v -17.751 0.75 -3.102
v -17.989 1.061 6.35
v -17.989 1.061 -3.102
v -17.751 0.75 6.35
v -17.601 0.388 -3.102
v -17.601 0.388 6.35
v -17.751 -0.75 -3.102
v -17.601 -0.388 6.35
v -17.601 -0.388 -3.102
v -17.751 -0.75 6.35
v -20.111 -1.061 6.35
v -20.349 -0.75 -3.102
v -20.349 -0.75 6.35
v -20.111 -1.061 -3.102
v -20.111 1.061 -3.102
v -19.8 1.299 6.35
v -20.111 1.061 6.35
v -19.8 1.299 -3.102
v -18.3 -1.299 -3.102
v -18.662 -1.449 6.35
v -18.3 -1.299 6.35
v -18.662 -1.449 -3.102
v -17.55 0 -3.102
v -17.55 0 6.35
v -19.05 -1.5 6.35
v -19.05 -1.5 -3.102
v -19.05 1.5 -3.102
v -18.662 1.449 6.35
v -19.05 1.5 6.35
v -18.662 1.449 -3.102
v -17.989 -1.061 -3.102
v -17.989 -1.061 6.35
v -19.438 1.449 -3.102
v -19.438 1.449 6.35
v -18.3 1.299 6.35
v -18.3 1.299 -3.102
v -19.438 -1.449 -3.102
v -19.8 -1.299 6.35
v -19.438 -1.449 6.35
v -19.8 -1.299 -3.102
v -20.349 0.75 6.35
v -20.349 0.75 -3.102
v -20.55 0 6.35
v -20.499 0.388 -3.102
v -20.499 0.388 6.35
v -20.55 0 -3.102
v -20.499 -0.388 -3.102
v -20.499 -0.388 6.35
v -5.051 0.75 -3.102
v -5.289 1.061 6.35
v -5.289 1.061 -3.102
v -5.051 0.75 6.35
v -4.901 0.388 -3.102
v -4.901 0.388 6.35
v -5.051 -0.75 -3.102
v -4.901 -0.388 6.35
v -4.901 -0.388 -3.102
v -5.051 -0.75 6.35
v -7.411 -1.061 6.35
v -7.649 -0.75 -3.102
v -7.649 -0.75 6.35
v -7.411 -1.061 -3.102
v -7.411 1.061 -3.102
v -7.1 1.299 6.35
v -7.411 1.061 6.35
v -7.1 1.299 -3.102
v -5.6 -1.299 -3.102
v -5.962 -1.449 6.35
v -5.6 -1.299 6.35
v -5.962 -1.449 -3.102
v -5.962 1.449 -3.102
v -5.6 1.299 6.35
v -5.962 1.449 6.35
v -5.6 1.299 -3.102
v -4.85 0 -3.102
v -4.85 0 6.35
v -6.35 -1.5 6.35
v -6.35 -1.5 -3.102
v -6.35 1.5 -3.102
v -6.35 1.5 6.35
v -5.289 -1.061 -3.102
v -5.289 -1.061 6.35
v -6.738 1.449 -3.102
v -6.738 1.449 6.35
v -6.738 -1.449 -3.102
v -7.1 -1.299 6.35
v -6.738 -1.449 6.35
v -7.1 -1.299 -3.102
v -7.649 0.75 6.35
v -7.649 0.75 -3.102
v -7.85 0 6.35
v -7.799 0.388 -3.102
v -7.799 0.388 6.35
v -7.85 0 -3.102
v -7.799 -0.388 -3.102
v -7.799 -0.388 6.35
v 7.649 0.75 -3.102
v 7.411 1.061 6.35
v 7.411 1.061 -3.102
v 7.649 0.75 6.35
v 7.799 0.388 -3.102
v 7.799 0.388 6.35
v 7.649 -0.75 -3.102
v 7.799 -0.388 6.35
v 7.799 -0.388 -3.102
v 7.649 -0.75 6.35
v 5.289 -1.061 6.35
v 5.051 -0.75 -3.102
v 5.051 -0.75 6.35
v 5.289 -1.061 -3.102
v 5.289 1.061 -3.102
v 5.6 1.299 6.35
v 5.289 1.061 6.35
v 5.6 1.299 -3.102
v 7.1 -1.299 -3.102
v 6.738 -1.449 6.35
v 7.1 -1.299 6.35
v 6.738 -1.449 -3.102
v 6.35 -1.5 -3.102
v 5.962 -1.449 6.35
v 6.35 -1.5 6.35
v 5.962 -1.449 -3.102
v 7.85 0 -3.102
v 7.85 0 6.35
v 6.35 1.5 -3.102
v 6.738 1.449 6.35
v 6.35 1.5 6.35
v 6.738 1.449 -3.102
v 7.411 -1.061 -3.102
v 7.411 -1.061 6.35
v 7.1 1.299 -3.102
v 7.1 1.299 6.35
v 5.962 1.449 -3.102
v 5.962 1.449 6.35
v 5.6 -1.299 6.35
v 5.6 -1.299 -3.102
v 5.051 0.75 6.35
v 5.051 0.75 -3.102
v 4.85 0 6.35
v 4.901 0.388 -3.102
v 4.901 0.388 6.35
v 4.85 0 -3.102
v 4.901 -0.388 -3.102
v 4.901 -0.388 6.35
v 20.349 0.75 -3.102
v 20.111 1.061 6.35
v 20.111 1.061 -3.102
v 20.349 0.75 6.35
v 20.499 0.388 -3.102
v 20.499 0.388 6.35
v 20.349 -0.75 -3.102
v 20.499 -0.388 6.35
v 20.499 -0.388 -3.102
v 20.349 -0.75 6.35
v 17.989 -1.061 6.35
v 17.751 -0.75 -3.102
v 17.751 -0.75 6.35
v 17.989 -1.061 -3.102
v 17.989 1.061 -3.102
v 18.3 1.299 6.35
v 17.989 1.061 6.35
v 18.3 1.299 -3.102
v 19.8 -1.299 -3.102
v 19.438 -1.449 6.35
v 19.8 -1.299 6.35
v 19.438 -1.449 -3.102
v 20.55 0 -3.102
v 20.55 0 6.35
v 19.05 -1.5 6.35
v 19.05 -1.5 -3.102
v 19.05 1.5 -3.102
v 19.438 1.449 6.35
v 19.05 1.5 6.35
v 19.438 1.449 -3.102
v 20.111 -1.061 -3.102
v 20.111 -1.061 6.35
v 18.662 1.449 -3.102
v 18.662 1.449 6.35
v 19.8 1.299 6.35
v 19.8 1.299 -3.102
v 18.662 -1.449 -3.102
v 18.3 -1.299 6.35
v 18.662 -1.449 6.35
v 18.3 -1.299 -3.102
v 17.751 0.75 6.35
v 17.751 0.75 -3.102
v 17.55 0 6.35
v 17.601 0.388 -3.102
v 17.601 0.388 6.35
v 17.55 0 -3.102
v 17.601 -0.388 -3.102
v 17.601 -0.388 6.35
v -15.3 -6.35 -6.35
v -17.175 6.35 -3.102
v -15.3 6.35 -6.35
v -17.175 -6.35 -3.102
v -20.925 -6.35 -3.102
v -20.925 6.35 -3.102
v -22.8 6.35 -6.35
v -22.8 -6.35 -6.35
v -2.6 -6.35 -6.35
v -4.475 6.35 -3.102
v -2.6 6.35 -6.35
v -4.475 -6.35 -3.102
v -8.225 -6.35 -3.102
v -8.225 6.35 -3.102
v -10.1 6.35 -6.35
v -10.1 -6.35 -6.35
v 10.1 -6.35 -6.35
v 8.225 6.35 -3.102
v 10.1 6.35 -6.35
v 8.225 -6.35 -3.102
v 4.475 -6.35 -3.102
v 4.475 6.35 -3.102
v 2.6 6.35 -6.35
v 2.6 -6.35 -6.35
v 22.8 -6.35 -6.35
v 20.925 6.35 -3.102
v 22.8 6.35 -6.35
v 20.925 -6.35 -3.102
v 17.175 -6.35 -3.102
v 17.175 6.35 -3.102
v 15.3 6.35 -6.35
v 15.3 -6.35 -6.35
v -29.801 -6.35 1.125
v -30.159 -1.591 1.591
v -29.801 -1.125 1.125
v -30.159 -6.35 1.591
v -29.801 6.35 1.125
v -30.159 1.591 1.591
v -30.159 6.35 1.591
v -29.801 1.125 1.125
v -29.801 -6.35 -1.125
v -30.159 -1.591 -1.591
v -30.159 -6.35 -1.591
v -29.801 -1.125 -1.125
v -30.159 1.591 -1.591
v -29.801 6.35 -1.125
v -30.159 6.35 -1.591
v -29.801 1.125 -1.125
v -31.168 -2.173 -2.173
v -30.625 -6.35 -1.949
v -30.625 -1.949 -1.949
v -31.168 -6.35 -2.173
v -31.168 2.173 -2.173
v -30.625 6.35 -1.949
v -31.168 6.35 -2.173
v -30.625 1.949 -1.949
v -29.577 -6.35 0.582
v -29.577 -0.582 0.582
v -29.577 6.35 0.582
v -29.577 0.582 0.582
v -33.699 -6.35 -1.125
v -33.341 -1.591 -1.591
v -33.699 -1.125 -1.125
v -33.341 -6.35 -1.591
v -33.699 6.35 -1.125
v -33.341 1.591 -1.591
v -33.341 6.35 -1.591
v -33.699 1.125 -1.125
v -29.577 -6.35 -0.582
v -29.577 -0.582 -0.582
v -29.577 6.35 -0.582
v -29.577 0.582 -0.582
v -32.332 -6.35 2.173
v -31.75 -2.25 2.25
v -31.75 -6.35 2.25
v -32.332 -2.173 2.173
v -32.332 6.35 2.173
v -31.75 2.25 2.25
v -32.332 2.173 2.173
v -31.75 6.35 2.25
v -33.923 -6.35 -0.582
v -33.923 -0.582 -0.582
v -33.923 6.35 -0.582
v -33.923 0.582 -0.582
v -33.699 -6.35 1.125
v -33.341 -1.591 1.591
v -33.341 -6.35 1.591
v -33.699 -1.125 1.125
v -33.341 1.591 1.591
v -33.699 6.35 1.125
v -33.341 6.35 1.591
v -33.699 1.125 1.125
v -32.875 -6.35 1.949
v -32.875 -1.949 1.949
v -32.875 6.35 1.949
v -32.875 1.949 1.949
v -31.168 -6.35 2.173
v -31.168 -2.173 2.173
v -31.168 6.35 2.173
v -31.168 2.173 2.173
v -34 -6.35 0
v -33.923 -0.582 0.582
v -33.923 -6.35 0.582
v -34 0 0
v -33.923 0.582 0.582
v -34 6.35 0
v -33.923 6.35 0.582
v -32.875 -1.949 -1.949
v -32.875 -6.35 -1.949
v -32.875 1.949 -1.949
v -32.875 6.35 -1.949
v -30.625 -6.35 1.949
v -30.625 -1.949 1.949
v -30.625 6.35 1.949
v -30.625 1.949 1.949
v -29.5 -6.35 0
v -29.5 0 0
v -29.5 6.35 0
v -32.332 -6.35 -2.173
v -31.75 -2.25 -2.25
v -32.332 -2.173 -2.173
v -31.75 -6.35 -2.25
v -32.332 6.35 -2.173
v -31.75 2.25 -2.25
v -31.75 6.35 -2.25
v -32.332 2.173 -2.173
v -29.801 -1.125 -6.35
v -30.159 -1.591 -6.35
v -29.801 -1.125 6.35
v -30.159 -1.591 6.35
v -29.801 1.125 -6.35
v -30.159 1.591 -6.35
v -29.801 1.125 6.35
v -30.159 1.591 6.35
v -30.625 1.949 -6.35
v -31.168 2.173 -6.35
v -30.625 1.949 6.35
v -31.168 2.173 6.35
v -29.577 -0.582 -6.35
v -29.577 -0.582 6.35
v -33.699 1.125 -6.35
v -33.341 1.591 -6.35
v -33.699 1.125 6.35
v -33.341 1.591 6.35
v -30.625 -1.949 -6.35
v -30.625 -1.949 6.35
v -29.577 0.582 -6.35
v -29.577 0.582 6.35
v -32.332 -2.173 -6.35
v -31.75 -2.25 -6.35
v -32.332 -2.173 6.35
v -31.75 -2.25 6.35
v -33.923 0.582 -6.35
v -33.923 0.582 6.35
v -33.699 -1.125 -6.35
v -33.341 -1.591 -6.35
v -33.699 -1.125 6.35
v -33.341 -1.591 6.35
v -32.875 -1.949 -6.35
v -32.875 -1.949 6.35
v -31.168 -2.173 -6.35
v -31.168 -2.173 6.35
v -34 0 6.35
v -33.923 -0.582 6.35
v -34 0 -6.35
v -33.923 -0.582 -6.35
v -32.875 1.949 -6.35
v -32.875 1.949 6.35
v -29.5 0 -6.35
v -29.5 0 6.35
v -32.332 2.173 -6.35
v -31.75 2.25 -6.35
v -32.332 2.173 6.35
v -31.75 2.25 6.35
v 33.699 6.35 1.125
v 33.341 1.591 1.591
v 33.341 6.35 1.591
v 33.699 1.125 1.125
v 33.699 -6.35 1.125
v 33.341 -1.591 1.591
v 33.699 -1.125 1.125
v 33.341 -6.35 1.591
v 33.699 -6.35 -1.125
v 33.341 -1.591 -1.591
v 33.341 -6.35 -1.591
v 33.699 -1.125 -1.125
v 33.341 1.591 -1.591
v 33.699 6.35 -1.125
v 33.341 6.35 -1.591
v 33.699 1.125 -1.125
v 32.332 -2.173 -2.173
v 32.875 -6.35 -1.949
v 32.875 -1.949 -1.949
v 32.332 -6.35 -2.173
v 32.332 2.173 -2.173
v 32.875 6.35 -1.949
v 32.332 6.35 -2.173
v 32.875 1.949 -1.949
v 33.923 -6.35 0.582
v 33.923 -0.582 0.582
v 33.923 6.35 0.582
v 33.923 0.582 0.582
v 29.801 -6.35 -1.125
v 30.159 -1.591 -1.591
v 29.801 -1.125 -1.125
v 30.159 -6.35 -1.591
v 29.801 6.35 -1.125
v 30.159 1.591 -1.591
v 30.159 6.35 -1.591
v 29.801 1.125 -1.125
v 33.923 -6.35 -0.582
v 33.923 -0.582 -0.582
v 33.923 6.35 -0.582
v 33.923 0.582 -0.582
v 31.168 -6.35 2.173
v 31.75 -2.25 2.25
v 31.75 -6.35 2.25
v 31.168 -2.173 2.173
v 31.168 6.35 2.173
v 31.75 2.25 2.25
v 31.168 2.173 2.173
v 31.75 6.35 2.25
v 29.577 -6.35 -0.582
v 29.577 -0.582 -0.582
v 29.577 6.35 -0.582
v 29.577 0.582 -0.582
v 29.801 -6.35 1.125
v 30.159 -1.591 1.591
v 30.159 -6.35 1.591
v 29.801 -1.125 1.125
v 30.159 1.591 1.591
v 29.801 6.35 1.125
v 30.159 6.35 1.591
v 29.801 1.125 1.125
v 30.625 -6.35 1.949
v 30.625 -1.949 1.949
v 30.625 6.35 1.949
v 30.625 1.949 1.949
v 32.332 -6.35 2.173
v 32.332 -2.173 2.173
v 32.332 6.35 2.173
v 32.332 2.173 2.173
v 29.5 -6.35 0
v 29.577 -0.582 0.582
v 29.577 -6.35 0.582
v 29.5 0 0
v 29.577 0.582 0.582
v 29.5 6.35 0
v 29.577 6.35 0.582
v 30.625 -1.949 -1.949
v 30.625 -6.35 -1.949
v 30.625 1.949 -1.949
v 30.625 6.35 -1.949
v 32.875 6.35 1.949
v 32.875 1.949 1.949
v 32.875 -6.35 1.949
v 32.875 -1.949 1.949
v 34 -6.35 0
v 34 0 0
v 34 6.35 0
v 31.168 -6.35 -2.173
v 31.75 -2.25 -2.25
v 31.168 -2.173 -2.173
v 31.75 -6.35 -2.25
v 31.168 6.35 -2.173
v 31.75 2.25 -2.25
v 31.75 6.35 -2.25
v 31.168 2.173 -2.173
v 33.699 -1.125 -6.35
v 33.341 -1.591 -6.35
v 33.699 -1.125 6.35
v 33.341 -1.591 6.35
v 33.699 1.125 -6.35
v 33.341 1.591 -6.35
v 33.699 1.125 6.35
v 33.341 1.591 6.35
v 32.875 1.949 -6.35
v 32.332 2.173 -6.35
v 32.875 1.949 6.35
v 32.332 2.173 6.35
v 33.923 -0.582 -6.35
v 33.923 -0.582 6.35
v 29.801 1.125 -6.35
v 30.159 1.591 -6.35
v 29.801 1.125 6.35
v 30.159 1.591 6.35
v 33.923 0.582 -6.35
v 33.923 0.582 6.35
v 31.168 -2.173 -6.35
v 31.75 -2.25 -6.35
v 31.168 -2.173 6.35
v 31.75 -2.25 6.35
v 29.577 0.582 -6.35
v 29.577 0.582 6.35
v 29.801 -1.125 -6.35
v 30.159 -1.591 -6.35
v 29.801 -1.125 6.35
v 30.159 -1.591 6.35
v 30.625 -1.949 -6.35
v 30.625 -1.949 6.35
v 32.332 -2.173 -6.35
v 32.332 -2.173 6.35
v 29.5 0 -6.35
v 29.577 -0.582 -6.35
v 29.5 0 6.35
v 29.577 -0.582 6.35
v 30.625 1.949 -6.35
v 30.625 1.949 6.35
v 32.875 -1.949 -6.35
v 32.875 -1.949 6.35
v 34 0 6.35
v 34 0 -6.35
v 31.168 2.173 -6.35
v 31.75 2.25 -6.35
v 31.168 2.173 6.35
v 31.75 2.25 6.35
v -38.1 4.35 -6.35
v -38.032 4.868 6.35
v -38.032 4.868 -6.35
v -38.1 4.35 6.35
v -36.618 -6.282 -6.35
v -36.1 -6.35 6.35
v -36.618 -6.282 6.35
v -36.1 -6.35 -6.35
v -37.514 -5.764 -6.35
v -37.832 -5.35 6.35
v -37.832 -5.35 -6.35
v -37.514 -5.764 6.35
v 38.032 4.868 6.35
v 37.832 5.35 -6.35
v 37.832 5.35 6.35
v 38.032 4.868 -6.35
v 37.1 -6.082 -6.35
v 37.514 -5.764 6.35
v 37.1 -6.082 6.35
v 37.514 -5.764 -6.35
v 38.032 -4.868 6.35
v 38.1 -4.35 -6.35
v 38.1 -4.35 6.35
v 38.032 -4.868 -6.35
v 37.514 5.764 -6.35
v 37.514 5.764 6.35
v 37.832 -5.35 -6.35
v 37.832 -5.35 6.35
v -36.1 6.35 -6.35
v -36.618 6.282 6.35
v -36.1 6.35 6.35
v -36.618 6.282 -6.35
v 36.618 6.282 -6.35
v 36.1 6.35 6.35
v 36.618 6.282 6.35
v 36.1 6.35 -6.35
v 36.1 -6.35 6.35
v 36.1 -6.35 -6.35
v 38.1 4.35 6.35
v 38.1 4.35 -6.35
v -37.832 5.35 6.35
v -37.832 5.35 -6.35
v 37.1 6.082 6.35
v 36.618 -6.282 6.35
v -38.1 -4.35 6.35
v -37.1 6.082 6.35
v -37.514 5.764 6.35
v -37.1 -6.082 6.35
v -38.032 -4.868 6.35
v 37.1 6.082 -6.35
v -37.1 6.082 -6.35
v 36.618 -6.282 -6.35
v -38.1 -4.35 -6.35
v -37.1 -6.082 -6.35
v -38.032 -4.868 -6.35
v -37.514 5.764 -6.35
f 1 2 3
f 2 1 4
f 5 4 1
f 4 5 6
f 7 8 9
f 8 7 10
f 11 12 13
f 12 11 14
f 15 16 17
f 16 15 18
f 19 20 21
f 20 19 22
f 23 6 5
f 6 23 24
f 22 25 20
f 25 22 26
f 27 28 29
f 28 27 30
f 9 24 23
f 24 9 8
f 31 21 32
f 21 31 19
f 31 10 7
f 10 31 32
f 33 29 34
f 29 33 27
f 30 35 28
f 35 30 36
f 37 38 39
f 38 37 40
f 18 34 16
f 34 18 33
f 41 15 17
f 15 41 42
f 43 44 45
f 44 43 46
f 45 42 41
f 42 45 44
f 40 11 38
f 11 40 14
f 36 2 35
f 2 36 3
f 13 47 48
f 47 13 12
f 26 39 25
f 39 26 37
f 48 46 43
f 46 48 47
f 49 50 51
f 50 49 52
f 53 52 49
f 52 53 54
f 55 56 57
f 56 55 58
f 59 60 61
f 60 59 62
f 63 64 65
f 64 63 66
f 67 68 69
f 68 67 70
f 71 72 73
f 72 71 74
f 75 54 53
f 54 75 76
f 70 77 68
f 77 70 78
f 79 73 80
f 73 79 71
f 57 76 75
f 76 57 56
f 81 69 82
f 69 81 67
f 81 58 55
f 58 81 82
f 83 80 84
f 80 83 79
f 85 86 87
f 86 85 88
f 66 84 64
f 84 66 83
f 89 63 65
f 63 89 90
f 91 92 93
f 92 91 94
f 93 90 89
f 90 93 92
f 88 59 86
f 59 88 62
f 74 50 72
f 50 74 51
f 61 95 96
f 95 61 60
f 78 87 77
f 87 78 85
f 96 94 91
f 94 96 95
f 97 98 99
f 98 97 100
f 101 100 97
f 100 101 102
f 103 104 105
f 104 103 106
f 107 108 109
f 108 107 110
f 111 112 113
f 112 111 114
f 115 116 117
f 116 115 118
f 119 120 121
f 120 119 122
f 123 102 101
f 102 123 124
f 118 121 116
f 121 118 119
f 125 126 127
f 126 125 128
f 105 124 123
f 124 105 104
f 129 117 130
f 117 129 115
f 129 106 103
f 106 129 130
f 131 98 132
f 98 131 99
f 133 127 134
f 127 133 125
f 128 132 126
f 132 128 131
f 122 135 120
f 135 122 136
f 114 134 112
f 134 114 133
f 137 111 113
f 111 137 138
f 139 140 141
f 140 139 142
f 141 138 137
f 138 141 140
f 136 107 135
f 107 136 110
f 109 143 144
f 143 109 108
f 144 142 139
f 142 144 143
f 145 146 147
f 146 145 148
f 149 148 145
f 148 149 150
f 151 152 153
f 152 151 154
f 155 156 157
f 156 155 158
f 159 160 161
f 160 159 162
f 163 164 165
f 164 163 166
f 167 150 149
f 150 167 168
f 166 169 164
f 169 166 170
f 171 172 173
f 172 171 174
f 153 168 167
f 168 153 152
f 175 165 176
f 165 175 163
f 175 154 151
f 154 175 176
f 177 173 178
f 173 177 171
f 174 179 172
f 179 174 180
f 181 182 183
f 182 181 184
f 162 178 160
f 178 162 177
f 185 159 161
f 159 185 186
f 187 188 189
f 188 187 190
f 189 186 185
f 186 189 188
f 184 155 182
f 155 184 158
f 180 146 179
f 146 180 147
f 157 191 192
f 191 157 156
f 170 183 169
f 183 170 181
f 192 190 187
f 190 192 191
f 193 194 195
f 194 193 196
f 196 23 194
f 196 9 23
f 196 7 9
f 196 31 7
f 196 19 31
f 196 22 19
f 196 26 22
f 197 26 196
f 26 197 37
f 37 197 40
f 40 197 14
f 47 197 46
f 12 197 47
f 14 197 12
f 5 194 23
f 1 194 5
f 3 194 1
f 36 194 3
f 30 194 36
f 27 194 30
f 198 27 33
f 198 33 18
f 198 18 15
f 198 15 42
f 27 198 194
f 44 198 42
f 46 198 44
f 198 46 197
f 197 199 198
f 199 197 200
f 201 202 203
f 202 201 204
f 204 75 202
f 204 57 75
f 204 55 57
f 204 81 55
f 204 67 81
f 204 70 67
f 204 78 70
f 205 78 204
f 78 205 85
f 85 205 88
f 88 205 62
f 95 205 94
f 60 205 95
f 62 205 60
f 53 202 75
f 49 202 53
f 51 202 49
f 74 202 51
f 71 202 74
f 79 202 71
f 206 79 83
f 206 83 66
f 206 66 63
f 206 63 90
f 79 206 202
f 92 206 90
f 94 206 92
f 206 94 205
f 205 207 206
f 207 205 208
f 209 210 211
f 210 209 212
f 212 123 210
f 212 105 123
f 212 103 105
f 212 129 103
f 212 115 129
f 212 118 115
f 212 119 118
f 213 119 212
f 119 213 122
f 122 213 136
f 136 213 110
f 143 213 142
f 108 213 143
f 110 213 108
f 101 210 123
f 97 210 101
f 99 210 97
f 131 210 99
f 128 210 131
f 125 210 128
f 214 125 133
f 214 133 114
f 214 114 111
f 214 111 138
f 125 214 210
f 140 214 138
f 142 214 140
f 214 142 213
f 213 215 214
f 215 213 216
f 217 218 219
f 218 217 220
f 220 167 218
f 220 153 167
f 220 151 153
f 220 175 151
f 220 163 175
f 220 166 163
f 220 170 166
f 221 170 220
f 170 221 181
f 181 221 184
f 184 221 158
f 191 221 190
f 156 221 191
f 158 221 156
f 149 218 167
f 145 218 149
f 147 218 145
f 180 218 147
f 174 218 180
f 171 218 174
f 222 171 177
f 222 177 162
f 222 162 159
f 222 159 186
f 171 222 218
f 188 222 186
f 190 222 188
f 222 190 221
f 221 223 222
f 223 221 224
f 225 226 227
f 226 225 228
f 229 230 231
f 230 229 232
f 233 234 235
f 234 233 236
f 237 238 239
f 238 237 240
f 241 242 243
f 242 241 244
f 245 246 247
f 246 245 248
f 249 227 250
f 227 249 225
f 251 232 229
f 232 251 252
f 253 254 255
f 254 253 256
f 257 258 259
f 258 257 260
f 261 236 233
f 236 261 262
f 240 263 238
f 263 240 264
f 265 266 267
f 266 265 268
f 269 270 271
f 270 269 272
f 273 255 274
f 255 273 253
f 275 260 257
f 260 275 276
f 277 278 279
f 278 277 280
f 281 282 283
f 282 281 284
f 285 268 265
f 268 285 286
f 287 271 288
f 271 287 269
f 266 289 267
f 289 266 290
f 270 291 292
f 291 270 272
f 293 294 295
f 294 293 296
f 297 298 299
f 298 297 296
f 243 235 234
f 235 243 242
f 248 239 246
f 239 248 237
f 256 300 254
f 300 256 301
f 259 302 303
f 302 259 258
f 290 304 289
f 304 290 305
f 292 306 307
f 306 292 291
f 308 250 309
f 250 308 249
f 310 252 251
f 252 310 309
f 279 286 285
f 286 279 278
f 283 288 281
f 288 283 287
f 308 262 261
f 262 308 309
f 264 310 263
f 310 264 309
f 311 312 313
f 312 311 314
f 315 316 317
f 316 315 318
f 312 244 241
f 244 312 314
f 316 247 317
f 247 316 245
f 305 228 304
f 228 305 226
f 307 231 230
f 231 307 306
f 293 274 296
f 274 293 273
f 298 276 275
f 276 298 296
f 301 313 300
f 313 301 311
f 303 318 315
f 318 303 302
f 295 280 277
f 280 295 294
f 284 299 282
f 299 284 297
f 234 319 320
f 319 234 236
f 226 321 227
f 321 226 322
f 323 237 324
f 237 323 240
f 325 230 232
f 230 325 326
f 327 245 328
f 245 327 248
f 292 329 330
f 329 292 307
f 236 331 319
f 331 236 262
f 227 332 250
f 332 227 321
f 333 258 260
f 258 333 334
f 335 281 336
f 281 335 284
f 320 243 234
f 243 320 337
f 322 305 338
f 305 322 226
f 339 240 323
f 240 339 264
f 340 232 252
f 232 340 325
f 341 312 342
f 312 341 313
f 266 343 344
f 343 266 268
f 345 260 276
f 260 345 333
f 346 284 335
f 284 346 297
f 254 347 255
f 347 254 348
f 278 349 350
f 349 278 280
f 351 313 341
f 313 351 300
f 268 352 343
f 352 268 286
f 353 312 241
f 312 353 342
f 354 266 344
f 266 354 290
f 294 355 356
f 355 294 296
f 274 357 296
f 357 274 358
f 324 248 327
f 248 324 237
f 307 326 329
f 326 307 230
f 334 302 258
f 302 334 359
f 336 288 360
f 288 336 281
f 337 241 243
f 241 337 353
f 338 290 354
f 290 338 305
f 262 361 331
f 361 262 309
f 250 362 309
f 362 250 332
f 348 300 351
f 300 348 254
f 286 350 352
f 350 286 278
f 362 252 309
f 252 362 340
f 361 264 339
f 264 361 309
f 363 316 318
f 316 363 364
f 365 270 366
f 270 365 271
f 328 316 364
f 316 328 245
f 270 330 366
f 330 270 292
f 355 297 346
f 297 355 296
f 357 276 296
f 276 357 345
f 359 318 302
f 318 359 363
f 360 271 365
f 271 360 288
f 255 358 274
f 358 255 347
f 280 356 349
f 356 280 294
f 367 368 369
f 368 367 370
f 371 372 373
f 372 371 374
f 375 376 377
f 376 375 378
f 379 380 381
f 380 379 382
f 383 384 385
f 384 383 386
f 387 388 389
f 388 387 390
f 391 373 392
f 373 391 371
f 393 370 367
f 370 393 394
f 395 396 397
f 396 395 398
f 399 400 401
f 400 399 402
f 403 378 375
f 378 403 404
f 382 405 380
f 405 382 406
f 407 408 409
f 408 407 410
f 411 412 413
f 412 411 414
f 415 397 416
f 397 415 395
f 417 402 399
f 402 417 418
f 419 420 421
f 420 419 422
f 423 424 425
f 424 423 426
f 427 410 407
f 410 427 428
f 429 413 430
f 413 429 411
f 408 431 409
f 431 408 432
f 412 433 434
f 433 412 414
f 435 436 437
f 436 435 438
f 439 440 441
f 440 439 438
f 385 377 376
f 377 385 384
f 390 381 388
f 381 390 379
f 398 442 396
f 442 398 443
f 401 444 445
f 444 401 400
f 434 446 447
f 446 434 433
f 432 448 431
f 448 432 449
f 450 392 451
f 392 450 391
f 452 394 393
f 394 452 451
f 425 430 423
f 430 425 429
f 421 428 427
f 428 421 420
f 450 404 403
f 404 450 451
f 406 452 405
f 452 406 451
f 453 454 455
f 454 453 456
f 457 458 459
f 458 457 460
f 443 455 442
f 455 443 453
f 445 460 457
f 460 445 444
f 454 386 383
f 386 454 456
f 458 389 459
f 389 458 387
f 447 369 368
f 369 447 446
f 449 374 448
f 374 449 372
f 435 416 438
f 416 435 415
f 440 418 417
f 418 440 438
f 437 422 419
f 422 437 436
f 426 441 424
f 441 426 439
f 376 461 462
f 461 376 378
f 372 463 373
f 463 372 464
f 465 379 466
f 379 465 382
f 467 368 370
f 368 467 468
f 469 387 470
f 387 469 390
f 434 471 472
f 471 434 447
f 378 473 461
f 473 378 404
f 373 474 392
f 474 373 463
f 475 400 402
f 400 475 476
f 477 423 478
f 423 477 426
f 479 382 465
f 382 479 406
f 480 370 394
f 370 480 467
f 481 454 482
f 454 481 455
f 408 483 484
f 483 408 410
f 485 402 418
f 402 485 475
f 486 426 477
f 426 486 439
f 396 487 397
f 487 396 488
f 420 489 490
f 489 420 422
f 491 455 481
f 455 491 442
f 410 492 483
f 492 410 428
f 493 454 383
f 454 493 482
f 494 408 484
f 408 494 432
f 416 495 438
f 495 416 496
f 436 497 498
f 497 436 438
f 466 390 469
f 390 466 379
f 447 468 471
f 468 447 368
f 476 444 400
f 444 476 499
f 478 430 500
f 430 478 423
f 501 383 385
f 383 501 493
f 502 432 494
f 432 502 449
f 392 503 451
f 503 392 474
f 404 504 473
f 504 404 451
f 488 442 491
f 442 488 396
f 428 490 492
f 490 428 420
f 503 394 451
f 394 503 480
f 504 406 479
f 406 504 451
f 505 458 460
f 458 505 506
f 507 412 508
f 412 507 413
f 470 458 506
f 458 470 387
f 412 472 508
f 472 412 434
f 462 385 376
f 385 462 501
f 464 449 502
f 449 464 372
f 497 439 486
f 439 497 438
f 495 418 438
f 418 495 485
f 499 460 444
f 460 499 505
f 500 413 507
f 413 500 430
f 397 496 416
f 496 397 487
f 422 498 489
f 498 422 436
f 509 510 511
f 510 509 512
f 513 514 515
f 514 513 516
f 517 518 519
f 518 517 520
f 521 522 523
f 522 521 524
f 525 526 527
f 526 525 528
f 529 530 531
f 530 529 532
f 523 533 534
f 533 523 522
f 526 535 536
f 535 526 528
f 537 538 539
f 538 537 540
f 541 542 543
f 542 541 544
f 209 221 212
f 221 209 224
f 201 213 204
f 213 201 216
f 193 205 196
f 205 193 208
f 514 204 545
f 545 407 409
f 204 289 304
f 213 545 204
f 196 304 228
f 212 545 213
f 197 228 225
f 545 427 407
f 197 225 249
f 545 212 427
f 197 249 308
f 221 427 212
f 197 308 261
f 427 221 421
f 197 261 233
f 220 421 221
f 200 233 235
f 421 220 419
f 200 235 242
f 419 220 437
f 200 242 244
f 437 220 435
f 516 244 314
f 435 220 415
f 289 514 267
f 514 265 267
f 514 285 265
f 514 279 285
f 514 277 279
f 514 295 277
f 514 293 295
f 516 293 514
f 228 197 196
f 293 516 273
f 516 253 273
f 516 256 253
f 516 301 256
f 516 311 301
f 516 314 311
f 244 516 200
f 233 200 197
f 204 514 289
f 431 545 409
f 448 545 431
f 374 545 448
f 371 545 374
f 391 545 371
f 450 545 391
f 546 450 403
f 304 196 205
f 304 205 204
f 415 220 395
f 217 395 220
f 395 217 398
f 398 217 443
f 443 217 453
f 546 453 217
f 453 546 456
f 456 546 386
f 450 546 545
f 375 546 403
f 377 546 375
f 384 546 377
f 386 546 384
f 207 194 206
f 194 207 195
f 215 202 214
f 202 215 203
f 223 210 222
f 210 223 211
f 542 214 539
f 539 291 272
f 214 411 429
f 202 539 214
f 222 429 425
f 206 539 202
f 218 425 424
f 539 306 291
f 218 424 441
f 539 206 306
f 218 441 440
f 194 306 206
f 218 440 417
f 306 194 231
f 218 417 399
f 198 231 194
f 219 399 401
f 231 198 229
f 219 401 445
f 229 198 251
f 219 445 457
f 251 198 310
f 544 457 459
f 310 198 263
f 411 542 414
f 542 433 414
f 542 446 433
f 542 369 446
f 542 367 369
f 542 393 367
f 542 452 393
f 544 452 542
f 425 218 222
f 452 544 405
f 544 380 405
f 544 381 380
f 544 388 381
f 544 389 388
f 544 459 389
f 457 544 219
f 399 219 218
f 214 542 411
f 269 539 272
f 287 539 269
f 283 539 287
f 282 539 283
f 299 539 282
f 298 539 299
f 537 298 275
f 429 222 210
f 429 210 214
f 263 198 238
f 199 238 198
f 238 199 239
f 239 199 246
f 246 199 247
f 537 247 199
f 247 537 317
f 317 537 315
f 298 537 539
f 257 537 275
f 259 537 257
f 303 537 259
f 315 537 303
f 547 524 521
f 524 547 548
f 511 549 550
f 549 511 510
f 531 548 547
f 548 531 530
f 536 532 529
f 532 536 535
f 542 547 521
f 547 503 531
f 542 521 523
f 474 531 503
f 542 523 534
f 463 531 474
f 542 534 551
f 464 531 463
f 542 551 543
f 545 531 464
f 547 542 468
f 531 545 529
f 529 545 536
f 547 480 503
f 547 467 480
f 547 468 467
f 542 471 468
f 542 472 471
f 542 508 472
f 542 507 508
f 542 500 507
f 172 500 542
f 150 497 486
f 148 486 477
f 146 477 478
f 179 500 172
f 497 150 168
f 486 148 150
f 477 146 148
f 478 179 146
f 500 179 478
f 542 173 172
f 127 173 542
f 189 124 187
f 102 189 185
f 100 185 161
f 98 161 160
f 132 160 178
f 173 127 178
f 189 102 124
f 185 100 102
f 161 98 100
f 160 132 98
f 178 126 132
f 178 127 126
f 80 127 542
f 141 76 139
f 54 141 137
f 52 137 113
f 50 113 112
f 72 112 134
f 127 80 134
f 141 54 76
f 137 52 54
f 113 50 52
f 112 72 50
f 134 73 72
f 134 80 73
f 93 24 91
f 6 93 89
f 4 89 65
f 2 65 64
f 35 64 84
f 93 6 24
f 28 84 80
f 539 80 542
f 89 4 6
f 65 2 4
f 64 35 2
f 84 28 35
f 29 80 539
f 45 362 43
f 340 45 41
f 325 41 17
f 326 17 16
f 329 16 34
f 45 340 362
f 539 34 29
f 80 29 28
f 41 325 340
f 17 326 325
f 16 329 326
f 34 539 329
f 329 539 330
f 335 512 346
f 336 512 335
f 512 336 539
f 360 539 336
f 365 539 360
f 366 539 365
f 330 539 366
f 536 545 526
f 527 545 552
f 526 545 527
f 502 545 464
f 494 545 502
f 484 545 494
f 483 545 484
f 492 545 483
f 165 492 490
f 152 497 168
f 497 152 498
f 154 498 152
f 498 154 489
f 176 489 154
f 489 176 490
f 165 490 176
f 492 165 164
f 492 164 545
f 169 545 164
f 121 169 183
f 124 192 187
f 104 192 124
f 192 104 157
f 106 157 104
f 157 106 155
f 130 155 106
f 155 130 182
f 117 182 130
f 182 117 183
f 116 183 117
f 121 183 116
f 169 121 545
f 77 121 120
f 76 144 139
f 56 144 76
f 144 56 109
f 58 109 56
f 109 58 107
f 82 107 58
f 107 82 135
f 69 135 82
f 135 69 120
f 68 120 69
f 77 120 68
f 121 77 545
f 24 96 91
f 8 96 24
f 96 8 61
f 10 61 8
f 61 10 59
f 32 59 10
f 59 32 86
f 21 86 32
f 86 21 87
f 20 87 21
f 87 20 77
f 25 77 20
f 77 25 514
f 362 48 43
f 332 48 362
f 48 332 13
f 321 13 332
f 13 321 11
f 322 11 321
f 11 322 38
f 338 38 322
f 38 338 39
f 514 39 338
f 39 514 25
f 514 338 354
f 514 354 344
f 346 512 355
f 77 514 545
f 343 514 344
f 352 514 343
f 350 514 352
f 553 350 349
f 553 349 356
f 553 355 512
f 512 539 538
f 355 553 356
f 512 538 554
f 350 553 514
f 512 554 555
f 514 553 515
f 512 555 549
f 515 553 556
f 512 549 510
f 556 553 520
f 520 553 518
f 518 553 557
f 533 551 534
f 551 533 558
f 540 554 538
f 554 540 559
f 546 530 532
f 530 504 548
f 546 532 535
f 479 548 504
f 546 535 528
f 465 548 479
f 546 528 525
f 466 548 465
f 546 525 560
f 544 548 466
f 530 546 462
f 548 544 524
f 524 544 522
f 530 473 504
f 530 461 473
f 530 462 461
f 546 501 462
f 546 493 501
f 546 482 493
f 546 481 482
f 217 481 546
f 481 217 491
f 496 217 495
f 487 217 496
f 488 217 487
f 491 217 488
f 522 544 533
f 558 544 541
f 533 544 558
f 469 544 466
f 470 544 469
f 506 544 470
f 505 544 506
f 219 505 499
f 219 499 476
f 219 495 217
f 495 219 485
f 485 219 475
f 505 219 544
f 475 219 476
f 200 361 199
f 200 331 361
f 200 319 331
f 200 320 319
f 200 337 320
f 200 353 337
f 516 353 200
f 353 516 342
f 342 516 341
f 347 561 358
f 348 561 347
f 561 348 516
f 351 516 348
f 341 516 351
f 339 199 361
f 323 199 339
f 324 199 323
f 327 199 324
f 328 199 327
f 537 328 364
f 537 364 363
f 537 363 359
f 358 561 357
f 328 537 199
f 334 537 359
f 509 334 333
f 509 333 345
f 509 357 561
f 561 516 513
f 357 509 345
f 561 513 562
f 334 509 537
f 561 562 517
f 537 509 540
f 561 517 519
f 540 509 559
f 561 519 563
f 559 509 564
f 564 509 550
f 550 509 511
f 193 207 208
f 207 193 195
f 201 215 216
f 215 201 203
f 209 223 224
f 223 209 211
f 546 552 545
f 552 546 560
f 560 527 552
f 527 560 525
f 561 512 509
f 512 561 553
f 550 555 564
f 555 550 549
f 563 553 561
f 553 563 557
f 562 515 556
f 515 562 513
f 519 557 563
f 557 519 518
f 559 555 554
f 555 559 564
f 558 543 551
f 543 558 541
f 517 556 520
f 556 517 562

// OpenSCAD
// file: ../lib/TOGMod1Constructors.scad
// TOGMod1Constructors-v1.6
// 
// Functions to construct objects understood by TOGMod1
// 
// v1.1:
// - Add togmod1_make_rounded_rect
// v1.2:
// - togmod1_make_rounded_rect can make ovals
// v1.3:
// - togmod1_circle_points, to just get the points of a circle
// - if pos parameter to circle function has a third element,
//   returned vertexes will include it as the z component;
// v1.3.1
// - Some assertions
// v1.4:
// - Refactor togmod1_rounded_rect_points and togmod1_circle_points
//   to use togmod1__make_nd_vector_adder for adapting to whatever
//   `pos` parameter is.
// v1.5:
// - togmod_rounded_rect_points will not simplify completely rounded sides
//   (where length of side is exactly twice the rounding radius)
//   unless simplify_rounded_sides=true
//   - This makes it more useful for polyhedron generation,
//     where radius varies, but number of points must remain constant.
// v1.6:
// - togmod1_make_rect makes a simple rectangle
// - togmod1_make_rounded_rect will defer to togmod1_make_rect when r=0

use <./TOGArrayLib1.scad>

function togmod1__make_nd_vector_adder(origin=[0,0]) =
	let(origin_is_zero = tal1_reduce(true, origin, function(prev,item) prev && item == 0))
	origin_is_zero ? (function(vec) len(vec) >= len(origin) ? vec : tal1_replace_at(origin, 0, vec)) :
	function(vec) [
		for(i=[0:1:max(len(origin),len(vec))-1]) (len(vec) > i ? vec[i] : 0) + (len(origin) > i ? origin[i] : 0),
	];

assert([1,2,3] == togmod1__make_nd_vector_adder()([1,2,3]));
echo(togmod1__make_nd_vector_adder([0,0,3])([1,2]));
assert([1,2,3] == togmod1__make_nd_vector_adder([0,0,3])([1,2]));


function togmod1_make_cuboid(size) =
	assert(is_list(size))
	assert(len(size) >= 3)
	assert(is_num(size[0]))
	assert(is_num(size[1]))
	assert(is_num(size[2]))
	["polyhedron-vf", [
		[-size[0]/2, -size[1]/2, -size[2]/2],
		[+size[0]/2, -size[1]/2, -size[2]/2],
		[-size[0]/2, +size[1]/2, -size[2]/2],
		[+size[0]/2, +size[1]/2, -size[2]/2],
		[-size[0]/2, -size[1]/2, +size[2]/2],
		[+size[0]/2, -size[1]/2, +size[2]/2],
		[-size[0]/2, +size[1]/2, +size[2]/2],
		[+size[0]/2, +size[1]/2, +size[2]/2]
	], [
		[0,1,3,2],[0,4,5,1],[4,6,7,5],[3,7,6,2],[1,5,7,3],[6,4,0,2]
	]];

function togmod1_make_polygon(verts) =
	["polygon-vp", verts, [[for( i=[0:1:len(verts)-1] ) i%len(verts)]]];

function togmod1_rounded_rect_points(size, r, pos=[0,0], simplify_rounded_sides=false) =
	assert(is_list(size))
	assert(len(size) >= 2)
	let(radii = is_list(r) ? r : is_num(r) ? [r,r] : assert(false, "rounded_rect r(adius) should be list<num> or num"))
	let(rx = radii[0])
	let(ry = radii[1])
	assert(is_num(rx))
	assert(is_num(ry))
	assert(size[0] >= 2*rx, str("size[0] must be >= 2*r[0]; size[0] = ",size[0],", 2*r[0] = ",2*rx))
	assert(size[1] >= 2*ry, str("size[1] must be >= 2*r[1]; size[1] = ",size[1],", 2*r[1] = ",2*ry))
	let(quarterfn=max($fn/4, 1))
	let(qfnx = simplify_rounded_sides && size[0] == 2*rx ? quarterfn-1 : quarterfn)
	let(qfny = simplify_rounded_sides && size[1] == 2*ry ? quarterfn-1 : quarterfn)
	let(finalizepos = togmod1__make_nd_vector_adder(pos))
[
	for(a=[0 : 1 : qfnx]) let(ang=      a*90/quarterfn) finalizepos([ size[0]/2-rx + rx*cos(ang),  size[1]/2-ry + ry*sin(ang)]),
	for(a=[0 : 1 : qfny]) let(ang= 90 + a*90/quarterfn) finalizepos([-size[0]/2+rx + rx*cos(ang),  size[1]/2-ry + ry*sin(ang)]),
	for(a=[0 : 1 : qfnx]) let(ang=180 + a*90/quarterfn) finalizepos([-size[0]/2+rx + rx*cos(ang), -size[1]/2+ry + ry*sin(ang)]),
	for(a=[0 : 1 : qfny]) let(ang=270 + a*90/quarterfn) finalizepos([ size[0]/2-rx + rx*cos(ang), -size[1]/2+ry + ry*sin(ang)]),
];

function togmod1_make_rect(size) =
	togmod1_make_polygon([
		[-size[0]/2, -size[1]/2],
		[+size[0]/2, -size[1]/2],
		[+size[0]/2, +size[1]/2],
		[-size[0]/2, +size[1]/2],
	]);

function togmod1_make_rounded_rect(size, r) =
	r == 0 ? togmod1_make_rect(size) :
	togmod1_make_polygon(togmod1_rounded_rect_points(size,r,simplify_rounded_sides=true));

function togmod1_circle_points(r, pos=[0,0], d=undef) =
	assert( !is_undef(r) || !is_undef(d) )
	assert(!is_undef(pos[0]))
	assert(!is_undef(pos[1]))
	let(finalizepos = togmod1__make_nd_vector_adder(pos))
	let(r_ = !is_undef(r) ? r : d/2)
	let(fn = max($fn, 6))
	[for(i=[0 : 1 : fn-1]) finalizepos([r_*cos(i*360/fn), r_*sin(i*360/fn)])];

function togmod1_make_circle(r, pos=[0,0], d=undef) =
	togmod1_make_polygon(togmod1_circle_points(r=r, pos=pos, d=d));

function togmod1_make_cylinder(d, zrange=[0,1], r=undef, pos=[0,0]) =
	assert( !is_undef(r) || !is_undef(d) )
	let( r_ = !is_undef(r) ? r : d/2 )
	// TODO: Make polyhedron directly
	["linear-extrude-zs", zrange, togmod1_make_circle(r=r_, pos=pos)];

function togmod1__is_range1d(range) = is_list(range) && len(range) == 2 && is_num(range[0]) && is_num(range[1]);

function togmod1_linear_extrude_z(range, shape) =
	assert(togmod1__is_range1d(range))
	["linear-extrude-zs", range, shape];
function togmod1_linear_extrude_x(range, shape) =
	assert(togmod1__is_range1d(range))
	["rotate", [90, 0, 90], togmod1_linear_extrude_z(range, shape)];
function togmod1_linear_extrude_y(range, shape) =
	assert(togmod1__is_range1d(range))
	["rotate", [90, 0, 180], togmod1_linear_extrude_z(range, shape)];
// file: ../lib/TOGArrayLib1.scad
// TOGArrayLib1.4
// 
// Functions for working with arrays.
// 
// v1.1:
// - tal1_reduce assert(is_list(items)) to prevent infinite recursion
//   when given undefined or other non-list values
// v1.1.1:
// - Fix tal1_uniq_remap_v2 to return "list-remap-result" as the
//   first element of the returned list
// v1.2:
// - Add tal1_replace_at function
// v1.3:
// - tal1_is_vec_of, tal1_is_vec_of_num
// v1.4:
// - tal1_assert_for_each, for when you want to assert something
//   about each of a list of items and get nice failure messages

/**
 * Make a list with the contents of list `a`,
 * but starting at offset `off`, replaced by the contents of list `b`.
 * len(result) = max(len(a), off+len(b))
 */
function tal1_replace_at(a, off, b, default_value=undef, default_value_function=undef) =
	assert(is_list(a))
	assert(is_list(b))
	let( _dvf = !is_undef(default_value_function) ? default_value_function : function(i) default_value )
[
	for( i=[0:1:min(off,len(a))-1] ) a[i],
	for( i=[len(a):1:off-1] ) _dvf(i),
	for( i=[off:1:off+len(b)-1] ) b[i-off],
	for( i=[off+len(b):1:len(a)-1] ) a[i],
];

// Simplest case
assert([] == tal1_replace_at([], 0, []));
// Second simplest cases
assert(["foo"] == tal1_replace_at(["foo"], 0, []));
assert(["foo"] == tal1_replace_at([], 0, ["foo"]));
// Replace one item
assert(["foo","quux","baz"] == tal1_replace_at(["foo","bar","baz"], 1, ["quux"]));
// Replace and extend
assert(["foo","quux","tuna","tina"] == tal1_replace_at(["foo","bar","baz"], 1, ["quux", "tuna", "tina"]));
// Add beyond end of `a`
assert(["foo","zzz","quux"] == tal1_replace_at(["foo"], 2, ["quux"], default_value="zzz"));
// Adding 'nothing' should still fill to that point with defaults
assert(["foo","zzz","zzz"] == tal1_replace_at(["foo"], 3, [], default_value="zzz"));


function tal1_reduce(start, items, func, offset=0) =
	assert(is_list(items))
	len(items) == offset ? start :
	tal1_reduce(func(start, items[offset]), items, func, offset+1);

function tal1_consecutive_duplicate_count(items) = tal1_reduce(
	[0, undef],
	items,
	function(z,item) [z[0] + (item == z[1] ? 1 : 0), item]
)[0];

assert(0 == tal1_consecutive_duplicate_count([]));
assert(0 == tal1_consecutive_duplicate_count([50]));
assert(1 == tal1_consecutive_duplicate_count([50,50]));
assert(0 == tal1_consecutive_duplicate_count([50,51,52,53]));
assert(1 == tal1_consecutive_duplicate_count([50,51,52,52]));
assert(3 == tal1_consecutive_duplicate_count([50,50,50,50]));

// Set test_size to arbirarily large values
// to ensure that OpenSCAD can handle heavy recursion
let(test_size=1000) assert(test_size/2 == tal1_consecutive_duplicate_count([for(i=[0:1:test_size-1]) floor(i/2)]));



function tal1_uniq_(items, off0, off1) =
	let(chunklen = off1-off0)
	chunklen == 0 ? [] :
	chunklen == 1 ? [items[off0]] :
	let(half=floor(chunklen/2))
	let(left  = tal1_uniq_(items, off0     , off0+half))
	let(right = tal1_uniq_(items, off0+half, off1     ))
	assert(len(left) > 0)
	assert(len(right) > 0)
	left[len(left)-1] == right[0] ? [each left, for(i=[1:1:len(right)-1]) right[i]] :
	[each left, each right];

/** Given a list of items, returns a new list with identical consecutive items merged */
function tal1_uniq(items) = tal1_uniq_(items, 0, len(items));

assert([] == tal1_uniq([]));
assert([123] == tal1_uniq([123]));
assert([55,0,1,2,3] == tal1_uniq([55,0,1,2,3]));
assert([55,0,1,2] == tal1_uniq([55,0,1,1,2]));
assert([55,0,1] == tal1_uniq([55,55,0,0,0,0,0,0,1,1,1,1]));
assert([55,0] == tal1_uniq([55,0,0,0,0,0,0,0]));



/**
 * Returns [new items, old index -> new index mapping].
 * No-op version.
 */
function tal1_uniq_remap_v1(items) =
	["list-remap-result", items, [for (vi=[0:1:len(items)-1]) vi]];

// [a, a, b, b, c, c]
//
// [a,    ...], []  -> [a],[0]
// [a, a, ...], [0] -> [a],[0,0]

assert([1,2,3] == [1,2,3]);

/**
 * Recursive version that will combine adjacent identical vertexes,
 * but will use the original items.
 */
function tal1_uniq_remap_v2(items, map=[]) =
	let(index = len(map))
	len(items) == index ? ["list-remap-result", items, map] :
	index == 0 ? tal1_uniq_remap_v2(items, [0]) :
	items[index] == items[map[index-1]] ? tal1_uniq_remap_v2(items, [for(vi=map) vi, map[index-1]]) :
	tal1_uniq_remap_v2(items, [for(vi=map) vi, index]);

assert(tal1_uniq_remap_v2([1,1,2,2,3,4]) == ["list-remap-result", [1,1,2,2,3,4], [0,0,2,2,4,5]]);


/**
 * Returns true if `vec` is a list of at least min_len items
 * and component_check(each item, even those beyond min_len) is true.
 */
function tal1_is_vec_of(vec, min_len=0, component_check=function(x) true) =
	assert(is_num(min_len) && min_len >= 0)
	assert(is_function(component_check))
	is_list(vec) && len(vec) >= min_len &&
	tal1_reduce(true, vec, function(prev,item) prev && component_check(item));

function tal1_is_vec_of_num(vec, min_len=0) = tal1_is_vec_of(vec, min_len, function(i) is_num(i));

assert( true == tal1_is_vec_of_num([1,2,3]));
assert( true == tal1_is_vec_of_num([]));
assert( true == tal1_is_vec_of_num([1,2,3], 3));
assert(false == tal1_is_vec_of_num([1,2], 3));
assert(false == tal1_is_vec_of_num([1,2,"spoon"], 3));
// Requirements are ambiguous when
// first min_len items are numbers, but there are non-numeric items afterwards,
// so let's error on the side of saying 'no, it's not a list of numbers';
// i.e. the item check and the min_len are independent.
assert(false == tal1_is_vec_of_num([1,2,3,"artichoke"], 3));


/**
 * Asserts that item_checker(each item in list, index of item)[0] is true.
 * Second element of item_checker return value is assertion message.
 * Returns the original list, in case that's useful to you.
 */
function tal1_assert_for_each(list, item_checker) =
	let( _ignored = [ for(i=[0:1:len(list)-1])
		let(q=item_checker(list[i],i))
		let(passed=is_bool(q) ? q : is_list(q) ? q[0] : assert(false, str(
			"tal1_assert_for_each: item_checker should return Bool|[Bool,String], but returned ",
			q, " for item at index ", i)))
		let(message=is_list(q) ? q[1] : undef)
		assert(passed, message)
		q
	])
	list;

// Callback can return a boolean...
assert([1,2,3] == tal1_assert_for_each([1,2,3], function(v,i) is_num(v)));
// ...or a [boolean, string]
assert([1,2,3] == tal1_assert_for_each([1,2,3], function(v,i) [is_num(v), "element be a num"]));
// file: ../lib/TOGMod1.scad
// TOGMod1
// OpenSCAD library for representing shapes
// 
// See also: Functional OpenSCAD (https://github.com/thehans/FunctionalOpenSCAD)

module togmod1_domodule(mod) {
	assert(is_list(mod));
	assert(len(mod) > 0);
	if( mod[0] == "polygon-vp" ) {
		// ["polygon-vp", vertexes, paths]
		polygon(points=mod[1], paths=mod[2]);
	} else if( mod[0] == "polyhedron-vf" ) {
		polyhedron(mod[1], faces=mod[2]);
	} else if( mod[0] == "scale" ) {
		assert(len(mod) == 3);
		scale(mod[1]) togmod1_domodule(mod[2]);
	} else if( mod[0] == "translate" ) {
		assert(len(mod) == 3);
		assert(is_list(mod[1]));
		for(c=mod[1]) assert(is_num(c), "translate component should be numeric");
		translate(mod[1]) togmod1_domodule(mod[2]);
	} else if( mod[0] == "rotate" ) {
		assert(len(mod) == 3);
		rotate(mod[1]) togmod1_domodule(mod[2]);
	} else if( mod[0] == "intersection" ) {
		intersection_for( i=[1:1:len(mod)-1] ) togmod1_domodule(mod[i]);
	} else if( mod[0] == "difference" ) {
		difference() {
			togmod1_domodule(mod[1]);
			for( i=[2:1:len(mod)-1] ) togmod1_domodule(mod[i]);
		}
	} else if( mod[0] == "union" ) {
		for( i=[1:1:len(mod)-1] ) togmod1_domodule(mod[i]);
	} else if( mod[0] == "hull" ) {
		hull() for( i=[1:1:len(mod)-1] ) togmod1_domodule(mod[i]);
	} else if( mod[0] == "offset-rs" ) {
		assert(len(mod) == 3);
		assert(is_num(mod[1]));
		assert(is_list(mod[2]));
		offset(mod[1]) togmod1_domodule(mod[2]);
	} else if( mod[0] == "linear-extrude-zs" ) {
		// ["linear-extrude-zs", [z0,z1], 2d_shape] // centered
		// ["linear-extrude-zs", height, 2d_shape]
		let( zrange = is_list(mod[1]) ? mod[1] : [-mod[1]/2, mod[1]/2] ) {
			translate([0,0,zrange[0]]) linear_extrude(zrange[1]-zrange[0]) togmod1_domodule(mod[2]);
		}
	} else if( mod[0] == "render" ) {
		render() togmod1_domodule(mod[1]);
	} else if( mod[0] == "minkowski" ) {
		minkowski() {
			togmod1_domodule(mod[1]);
			togmod1_domodule(mod[2]);
		}
	} else if( mod[0] == "x-debug" ) {
		# togmod1_domodule(mod[1]);
	} else {
		assert(false, str("Unrecognized shape: ", mod[0]));
	}
}
// main file
// EdgeDrillJig1.0
// 
// To help guide your drill bit straight into the edge of something narrow.

atom_pitch = 12.7;
length_atoms = 6;
drill_hole_diameter = 3;
mounting_hole_diameter = 4.5;

use <../lib/TOGMod1.scad>
use <../lib/TOGPolyhedronLib1.scad>

function edj1_make_block(
	size,
	hole_spacing,
	drill_hole_diameter,
	mounting_hole_diameter
) =
	let( y_hole = ["rotate", [90,0,0], tphl1_make_z_cylinder(zrange=[-size[1], size[1]], d=mounting_hole_diameter, $fn=24)] )
	let( z_hole = tphl1_make_z_cylinder(zrange=[-size[2], size[2]], d=drill_hole_diameter, $fn=24) )
	let( dust_chute = ["rotate", [90,0,0], tphl1_make_z_cylinder(zrange=[-size[1], size[1]], d=drill_hole_diameter*2.5, $fn=6)] )
	let( rail_hull = tphl1_make_rounded_cuboid(size, r=[2, 2, 0], corner_shape="ovoid1", $fn=24) )
	["difference",
		rail_hull,
		for( xm = [-round(size[0]/hole_spacing)/2 + 1.5 : 1 : size[0]/hole_spacing/2 - 1.4] ) ["translate", [xm*hole_spacing, 0, 0], z_hole],
		for( xm = [-round(size[0]/hole_spacing)/2 + 1.5 : 1 : size[0]/hole_spacing/2 - 1.4] ) ["translate", [xm*hole_spacing, 0, -size[1]/2], dust_chute],
		for( xm = [-round(size[0]/hole_spacing)/2 + 0.5, size[0]/hole_spacing/2 - 0.5] ) for( xr=[0,90] ) ["translate", [xm*hole_spacing, 0, 0], ["rotate", [xr,0,0], y_hole]],
	];

togmod1_domodule(edj1_make_block(
	size=[length_atoms*atom_pitch, atom_pitch, atom_pitch],
	hole_spacing=atom_pitch,
	drill_hole_diameter = drill_hole_diameter,
	mounting_hole_diameter = mounting_hole_diameter
));
